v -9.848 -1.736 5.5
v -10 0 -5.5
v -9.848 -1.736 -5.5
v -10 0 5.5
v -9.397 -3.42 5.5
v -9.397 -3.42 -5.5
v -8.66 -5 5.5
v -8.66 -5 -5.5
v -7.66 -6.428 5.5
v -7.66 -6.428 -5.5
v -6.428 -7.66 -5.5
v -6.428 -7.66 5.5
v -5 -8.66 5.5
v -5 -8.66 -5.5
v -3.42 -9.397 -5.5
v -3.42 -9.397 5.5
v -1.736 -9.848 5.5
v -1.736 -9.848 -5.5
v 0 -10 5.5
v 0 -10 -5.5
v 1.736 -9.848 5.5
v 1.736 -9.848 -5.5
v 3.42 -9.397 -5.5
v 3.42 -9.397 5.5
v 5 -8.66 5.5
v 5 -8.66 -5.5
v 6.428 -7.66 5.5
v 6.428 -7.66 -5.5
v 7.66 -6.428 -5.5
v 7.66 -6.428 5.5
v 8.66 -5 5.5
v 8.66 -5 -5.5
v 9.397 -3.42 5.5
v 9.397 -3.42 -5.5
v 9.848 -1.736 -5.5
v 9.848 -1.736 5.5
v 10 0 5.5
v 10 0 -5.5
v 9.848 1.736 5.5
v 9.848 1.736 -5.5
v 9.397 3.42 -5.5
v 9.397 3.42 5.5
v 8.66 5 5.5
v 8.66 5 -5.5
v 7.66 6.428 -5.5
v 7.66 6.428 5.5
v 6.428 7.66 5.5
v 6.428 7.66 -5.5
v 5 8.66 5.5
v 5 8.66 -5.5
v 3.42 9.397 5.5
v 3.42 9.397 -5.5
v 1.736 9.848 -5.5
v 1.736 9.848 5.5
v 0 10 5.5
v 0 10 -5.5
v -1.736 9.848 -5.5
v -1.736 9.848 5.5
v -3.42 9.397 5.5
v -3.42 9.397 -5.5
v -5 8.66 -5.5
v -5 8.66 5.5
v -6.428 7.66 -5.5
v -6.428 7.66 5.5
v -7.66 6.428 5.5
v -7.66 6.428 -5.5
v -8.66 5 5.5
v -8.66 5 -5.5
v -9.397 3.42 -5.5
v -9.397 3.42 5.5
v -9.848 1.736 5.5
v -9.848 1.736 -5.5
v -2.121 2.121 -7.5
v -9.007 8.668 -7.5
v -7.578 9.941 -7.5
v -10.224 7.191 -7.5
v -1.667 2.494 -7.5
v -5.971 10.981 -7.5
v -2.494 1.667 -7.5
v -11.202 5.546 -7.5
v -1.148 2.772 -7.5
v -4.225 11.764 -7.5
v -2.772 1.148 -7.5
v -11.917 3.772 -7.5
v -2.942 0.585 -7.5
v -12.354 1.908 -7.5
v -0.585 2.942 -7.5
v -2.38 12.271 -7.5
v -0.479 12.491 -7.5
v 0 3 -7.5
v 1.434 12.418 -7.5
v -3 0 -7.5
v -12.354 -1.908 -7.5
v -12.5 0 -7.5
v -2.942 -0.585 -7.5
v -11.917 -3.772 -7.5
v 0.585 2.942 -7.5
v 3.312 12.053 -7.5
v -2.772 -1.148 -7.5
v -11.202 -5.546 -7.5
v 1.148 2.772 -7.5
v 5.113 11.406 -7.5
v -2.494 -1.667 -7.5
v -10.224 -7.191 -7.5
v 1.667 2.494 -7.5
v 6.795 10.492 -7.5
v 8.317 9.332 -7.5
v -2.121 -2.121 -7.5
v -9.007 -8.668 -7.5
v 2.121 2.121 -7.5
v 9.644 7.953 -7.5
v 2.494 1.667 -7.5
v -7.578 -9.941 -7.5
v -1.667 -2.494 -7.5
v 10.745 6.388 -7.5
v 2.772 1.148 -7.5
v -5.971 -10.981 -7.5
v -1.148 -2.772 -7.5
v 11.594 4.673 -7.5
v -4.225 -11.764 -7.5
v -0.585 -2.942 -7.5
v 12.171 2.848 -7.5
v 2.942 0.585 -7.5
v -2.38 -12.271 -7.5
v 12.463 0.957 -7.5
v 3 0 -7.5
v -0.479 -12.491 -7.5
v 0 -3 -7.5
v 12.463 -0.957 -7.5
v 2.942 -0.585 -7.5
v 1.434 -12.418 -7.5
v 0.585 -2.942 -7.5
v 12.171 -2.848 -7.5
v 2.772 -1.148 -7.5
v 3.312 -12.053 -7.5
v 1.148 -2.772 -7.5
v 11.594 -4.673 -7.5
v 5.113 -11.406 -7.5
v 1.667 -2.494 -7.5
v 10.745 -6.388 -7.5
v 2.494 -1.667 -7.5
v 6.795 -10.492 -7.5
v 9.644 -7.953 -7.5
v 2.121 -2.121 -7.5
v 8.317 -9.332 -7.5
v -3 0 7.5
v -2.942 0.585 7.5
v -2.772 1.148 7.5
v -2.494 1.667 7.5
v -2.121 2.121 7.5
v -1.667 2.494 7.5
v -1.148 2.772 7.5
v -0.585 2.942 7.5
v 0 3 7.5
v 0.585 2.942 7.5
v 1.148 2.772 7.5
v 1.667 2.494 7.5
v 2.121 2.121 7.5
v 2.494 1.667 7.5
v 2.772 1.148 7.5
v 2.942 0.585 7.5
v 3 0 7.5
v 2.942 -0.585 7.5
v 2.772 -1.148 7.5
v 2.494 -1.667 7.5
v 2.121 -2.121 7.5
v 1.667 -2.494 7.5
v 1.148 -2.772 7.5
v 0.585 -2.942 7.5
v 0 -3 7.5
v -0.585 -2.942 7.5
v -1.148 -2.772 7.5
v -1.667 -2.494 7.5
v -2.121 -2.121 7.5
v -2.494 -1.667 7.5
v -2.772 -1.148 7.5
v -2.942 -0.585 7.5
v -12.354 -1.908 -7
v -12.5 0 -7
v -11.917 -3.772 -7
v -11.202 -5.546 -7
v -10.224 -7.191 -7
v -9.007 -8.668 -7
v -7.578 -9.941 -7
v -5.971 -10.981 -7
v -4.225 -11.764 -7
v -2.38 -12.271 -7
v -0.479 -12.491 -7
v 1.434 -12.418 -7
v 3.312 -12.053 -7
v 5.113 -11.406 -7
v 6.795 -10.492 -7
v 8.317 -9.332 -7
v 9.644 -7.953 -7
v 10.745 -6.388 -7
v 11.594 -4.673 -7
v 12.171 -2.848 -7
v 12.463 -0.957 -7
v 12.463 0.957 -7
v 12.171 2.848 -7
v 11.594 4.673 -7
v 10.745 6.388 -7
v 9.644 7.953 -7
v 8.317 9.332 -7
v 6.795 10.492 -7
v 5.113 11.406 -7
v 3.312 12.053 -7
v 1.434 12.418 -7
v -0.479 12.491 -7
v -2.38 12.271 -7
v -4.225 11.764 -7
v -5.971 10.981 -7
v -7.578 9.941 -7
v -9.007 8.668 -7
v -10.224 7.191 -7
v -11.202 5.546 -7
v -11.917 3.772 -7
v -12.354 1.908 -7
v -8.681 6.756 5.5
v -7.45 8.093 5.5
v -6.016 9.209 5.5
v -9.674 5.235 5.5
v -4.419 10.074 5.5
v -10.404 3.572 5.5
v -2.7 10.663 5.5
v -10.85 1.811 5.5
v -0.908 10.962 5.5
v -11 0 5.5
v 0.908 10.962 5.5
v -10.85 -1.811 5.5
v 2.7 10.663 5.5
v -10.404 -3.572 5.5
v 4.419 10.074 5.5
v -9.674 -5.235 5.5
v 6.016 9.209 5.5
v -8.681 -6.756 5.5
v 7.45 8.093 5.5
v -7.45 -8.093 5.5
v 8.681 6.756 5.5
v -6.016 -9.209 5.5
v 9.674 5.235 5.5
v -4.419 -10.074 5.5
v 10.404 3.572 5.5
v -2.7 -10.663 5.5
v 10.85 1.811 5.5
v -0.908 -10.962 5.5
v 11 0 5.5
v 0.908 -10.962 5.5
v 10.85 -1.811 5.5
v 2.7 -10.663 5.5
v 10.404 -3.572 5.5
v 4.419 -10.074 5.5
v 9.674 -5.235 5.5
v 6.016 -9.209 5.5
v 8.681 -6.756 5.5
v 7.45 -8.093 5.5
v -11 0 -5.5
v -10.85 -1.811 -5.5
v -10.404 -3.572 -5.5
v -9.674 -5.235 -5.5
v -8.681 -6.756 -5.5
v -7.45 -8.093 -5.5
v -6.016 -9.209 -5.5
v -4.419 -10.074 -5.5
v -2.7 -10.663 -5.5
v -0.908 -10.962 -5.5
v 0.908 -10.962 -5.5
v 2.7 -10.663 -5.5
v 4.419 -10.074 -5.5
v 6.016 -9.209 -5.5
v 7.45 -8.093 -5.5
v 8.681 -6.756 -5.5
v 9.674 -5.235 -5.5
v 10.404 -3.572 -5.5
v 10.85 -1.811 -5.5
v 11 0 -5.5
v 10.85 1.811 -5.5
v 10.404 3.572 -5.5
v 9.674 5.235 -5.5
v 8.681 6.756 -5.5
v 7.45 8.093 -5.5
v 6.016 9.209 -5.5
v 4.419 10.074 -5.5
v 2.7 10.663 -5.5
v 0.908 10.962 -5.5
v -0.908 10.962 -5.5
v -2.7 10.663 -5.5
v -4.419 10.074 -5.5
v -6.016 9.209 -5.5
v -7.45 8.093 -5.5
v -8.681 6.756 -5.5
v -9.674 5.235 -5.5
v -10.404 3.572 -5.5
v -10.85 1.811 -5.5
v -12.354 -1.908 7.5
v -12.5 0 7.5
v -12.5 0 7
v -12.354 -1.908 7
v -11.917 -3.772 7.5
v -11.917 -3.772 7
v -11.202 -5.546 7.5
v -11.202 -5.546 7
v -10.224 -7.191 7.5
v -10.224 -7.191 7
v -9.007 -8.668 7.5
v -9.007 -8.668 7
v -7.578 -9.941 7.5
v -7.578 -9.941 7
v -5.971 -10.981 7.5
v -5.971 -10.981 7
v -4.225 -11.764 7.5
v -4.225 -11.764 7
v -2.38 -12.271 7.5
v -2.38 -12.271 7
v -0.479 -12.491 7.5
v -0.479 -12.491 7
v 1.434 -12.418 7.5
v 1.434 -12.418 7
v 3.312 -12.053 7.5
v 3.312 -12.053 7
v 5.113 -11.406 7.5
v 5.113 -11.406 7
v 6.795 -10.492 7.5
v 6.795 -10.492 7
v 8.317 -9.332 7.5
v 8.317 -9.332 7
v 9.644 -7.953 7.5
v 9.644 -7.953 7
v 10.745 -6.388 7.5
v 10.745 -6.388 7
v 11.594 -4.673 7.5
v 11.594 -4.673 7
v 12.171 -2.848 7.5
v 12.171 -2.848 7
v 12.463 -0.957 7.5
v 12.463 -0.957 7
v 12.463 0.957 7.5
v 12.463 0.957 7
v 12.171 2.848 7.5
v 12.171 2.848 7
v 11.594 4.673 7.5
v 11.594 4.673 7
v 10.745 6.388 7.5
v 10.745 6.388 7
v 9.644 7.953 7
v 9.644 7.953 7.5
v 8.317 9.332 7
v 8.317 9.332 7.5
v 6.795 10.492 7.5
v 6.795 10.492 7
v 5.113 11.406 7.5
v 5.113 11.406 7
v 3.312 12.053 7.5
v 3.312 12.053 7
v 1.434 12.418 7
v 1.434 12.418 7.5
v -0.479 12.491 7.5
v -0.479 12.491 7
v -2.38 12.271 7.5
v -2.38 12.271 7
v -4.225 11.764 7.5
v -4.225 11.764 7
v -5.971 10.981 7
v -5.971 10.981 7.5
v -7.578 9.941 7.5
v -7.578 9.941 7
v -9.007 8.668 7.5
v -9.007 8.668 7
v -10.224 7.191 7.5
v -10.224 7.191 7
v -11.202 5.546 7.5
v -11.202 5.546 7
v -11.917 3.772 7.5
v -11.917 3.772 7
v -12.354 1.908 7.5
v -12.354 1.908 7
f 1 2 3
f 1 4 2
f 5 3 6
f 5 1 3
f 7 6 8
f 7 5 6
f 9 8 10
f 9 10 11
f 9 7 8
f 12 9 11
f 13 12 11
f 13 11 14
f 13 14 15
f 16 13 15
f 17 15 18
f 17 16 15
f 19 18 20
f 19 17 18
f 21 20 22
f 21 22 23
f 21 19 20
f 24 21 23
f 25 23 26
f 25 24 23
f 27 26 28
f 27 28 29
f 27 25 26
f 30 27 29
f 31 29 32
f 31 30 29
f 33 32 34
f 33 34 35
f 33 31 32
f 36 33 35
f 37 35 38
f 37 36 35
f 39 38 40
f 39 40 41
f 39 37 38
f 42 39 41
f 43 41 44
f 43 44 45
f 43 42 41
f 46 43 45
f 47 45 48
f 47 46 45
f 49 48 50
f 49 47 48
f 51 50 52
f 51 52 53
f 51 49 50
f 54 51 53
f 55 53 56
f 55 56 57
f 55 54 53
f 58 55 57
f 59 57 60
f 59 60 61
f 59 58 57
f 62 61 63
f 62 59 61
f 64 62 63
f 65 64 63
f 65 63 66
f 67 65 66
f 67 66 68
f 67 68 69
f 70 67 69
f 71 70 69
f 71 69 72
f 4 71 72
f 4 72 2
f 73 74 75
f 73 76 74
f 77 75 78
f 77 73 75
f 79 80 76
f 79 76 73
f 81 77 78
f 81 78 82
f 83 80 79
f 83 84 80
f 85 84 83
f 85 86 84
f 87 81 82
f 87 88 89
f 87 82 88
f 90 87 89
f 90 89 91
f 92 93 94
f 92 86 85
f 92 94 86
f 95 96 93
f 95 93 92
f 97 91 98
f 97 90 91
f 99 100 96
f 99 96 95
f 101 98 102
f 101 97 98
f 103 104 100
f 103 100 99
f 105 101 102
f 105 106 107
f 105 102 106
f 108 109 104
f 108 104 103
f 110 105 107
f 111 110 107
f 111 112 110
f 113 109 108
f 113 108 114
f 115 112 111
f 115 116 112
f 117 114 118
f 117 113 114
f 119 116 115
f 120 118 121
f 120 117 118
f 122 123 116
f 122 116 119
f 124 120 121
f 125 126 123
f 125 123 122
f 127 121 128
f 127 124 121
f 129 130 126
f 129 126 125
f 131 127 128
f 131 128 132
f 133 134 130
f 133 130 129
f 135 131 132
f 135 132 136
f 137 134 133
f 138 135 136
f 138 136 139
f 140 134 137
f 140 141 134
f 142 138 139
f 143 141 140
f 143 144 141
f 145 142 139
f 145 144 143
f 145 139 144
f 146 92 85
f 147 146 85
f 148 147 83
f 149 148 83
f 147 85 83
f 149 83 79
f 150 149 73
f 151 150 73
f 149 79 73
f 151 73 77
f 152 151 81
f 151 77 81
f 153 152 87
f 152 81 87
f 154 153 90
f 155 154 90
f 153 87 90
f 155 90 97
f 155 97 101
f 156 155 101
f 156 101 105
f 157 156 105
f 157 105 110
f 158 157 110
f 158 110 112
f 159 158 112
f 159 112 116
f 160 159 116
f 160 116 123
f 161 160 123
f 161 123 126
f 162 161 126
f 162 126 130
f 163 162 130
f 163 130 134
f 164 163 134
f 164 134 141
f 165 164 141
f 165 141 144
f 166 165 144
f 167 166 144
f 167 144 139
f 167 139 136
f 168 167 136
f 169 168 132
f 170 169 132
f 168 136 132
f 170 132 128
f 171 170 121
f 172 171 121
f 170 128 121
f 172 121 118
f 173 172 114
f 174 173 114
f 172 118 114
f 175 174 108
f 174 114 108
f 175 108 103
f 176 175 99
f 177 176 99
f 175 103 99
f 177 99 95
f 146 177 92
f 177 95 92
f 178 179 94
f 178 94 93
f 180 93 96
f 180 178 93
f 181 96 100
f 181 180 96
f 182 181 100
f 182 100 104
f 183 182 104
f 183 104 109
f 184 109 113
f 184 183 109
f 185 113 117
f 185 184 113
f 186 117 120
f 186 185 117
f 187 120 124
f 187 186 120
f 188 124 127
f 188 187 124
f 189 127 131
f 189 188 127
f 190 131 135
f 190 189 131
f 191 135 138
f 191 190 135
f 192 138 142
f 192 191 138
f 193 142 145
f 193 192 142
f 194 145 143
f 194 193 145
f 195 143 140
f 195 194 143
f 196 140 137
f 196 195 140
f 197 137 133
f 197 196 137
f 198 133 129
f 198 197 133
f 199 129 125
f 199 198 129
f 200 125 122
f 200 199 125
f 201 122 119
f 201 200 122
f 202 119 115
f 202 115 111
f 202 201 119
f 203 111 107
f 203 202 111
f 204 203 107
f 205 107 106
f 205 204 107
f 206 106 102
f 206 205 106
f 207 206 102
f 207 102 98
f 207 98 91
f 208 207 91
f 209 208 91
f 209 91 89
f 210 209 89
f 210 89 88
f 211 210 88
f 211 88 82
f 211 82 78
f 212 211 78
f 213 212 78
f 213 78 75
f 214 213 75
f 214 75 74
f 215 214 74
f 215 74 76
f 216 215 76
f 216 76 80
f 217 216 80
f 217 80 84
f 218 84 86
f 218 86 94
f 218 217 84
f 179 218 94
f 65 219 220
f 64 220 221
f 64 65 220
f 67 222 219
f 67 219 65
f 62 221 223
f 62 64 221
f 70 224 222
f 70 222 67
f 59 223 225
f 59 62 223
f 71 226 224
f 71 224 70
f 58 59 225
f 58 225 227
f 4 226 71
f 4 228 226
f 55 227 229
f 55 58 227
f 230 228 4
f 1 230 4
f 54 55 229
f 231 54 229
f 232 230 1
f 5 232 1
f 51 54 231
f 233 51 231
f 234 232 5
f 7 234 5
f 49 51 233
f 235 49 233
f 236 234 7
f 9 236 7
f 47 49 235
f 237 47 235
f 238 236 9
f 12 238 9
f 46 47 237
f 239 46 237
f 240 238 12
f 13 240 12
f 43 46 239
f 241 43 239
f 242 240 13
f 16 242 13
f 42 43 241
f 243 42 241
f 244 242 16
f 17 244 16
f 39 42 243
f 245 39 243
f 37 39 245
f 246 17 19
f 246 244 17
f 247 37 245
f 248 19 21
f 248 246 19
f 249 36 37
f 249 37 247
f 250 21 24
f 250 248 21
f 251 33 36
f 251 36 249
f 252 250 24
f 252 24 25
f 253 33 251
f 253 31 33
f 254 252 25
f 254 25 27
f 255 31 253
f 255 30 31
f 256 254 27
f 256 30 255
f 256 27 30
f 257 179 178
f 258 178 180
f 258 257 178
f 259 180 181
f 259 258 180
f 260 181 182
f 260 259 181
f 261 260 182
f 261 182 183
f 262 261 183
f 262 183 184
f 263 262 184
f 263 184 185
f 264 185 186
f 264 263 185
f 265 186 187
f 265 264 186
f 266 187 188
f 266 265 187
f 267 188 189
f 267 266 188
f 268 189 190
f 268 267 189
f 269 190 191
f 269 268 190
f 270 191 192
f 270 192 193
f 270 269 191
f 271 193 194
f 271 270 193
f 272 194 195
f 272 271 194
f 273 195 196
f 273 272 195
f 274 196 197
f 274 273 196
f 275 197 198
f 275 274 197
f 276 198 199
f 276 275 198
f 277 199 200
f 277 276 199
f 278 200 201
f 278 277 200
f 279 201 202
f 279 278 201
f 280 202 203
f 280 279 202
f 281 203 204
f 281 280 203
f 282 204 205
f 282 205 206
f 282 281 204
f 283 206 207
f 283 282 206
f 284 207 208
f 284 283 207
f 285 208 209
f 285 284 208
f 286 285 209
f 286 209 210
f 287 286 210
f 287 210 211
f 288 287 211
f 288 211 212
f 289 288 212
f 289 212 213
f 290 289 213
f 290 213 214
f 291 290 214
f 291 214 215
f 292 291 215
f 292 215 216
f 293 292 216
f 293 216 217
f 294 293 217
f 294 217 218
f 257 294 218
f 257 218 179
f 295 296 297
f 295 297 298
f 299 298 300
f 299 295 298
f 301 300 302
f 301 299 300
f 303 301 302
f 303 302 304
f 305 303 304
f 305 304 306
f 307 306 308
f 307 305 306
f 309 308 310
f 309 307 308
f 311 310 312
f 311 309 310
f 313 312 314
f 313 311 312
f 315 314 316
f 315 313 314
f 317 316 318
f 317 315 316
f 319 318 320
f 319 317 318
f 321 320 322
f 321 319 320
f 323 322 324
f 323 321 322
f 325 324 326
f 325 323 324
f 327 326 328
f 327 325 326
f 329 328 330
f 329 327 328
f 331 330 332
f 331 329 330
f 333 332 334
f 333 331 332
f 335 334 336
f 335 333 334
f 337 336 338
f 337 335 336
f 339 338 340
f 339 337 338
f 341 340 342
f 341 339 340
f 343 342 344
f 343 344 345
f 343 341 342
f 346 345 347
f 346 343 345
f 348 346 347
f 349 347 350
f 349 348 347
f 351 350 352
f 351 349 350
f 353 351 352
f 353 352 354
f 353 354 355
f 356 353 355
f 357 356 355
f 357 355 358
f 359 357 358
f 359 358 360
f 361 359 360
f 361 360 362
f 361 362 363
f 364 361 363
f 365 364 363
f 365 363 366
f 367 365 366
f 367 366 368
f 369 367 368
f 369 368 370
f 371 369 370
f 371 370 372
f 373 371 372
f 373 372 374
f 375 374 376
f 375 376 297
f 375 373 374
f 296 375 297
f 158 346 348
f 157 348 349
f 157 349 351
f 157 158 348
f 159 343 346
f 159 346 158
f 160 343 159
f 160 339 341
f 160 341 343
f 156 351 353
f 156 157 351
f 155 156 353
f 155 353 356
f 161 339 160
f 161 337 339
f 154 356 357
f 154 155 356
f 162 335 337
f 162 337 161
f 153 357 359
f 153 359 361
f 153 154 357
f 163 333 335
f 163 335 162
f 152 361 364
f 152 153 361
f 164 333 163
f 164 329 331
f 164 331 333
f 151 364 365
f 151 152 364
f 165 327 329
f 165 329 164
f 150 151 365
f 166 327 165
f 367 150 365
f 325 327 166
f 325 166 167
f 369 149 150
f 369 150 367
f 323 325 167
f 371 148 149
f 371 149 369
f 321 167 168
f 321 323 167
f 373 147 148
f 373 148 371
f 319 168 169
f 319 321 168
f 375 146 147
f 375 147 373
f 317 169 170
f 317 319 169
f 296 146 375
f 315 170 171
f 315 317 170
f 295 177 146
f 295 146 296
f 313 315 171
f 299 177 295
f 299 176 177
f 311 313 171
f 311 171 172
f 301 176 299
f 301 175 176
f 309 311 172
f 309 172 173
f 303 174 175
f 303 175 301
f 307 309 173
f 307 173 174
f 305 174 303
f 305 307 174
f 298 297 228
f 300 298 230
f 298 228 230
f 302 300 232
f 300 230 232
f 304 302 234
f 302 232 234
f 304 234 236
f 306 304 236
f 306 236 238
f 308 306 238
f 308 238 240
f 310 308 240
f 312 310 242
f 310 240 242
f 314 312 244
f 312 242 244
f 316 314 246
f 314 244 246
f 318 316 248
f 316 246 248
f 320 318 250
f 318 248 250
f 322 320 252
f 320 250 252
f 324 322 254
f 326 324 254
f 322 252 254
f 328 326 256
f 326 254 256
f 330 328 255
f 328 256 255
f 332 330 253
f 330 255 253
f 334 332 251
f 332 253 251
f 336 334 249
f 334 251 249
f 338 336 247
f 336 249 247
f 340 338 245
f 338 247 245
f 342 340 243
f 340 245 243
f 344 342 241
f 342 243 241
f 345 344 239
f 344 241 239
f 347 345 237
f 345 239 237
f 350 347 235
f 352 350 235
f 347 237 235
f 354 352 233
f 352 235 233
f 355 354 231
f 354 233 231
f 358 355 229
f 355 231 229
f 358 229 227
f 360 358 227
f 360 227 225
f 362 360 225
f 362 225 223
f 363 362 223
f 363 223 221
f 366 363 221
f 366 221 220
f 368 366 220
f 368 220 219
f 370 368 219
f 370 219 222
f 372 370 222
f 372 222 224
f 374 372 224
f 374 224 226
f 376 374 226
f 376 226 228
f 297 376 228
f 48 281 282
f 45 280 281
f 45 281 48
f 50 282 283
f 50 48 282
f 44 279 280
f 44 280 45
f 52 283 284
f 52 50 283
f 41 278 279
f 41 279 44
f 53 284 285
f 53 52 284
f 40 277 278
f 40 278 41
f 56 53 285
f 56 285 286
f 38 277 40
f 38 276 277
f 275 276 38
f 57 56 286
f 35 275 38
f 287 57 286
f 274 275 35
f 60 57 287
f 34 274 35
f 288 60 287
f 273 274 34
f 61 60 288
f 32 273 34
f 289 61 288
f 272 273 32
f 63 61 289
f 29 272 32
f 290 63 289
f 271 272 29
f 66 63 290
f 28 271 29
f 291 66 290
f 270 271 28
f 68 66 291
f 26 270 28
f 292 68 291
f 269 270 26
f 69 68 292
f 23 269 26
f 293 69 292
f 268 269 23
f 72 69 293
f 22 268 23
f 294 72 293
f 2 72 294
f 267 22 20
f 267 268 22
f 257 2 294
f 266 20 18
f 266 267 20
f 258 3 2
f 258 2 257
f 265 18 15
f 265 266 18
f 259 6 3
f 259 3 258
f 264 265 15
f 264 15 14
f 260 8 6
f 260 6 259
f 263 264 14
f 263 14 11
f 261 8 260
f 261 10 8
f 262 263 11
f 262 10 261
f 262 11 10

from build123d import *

# Parameters (mm, degrees)
SKETCH2_R          = 3
CUT_EXTRUDE1_DEPTH = 24.184046239
CHAMFER1_SIZE      = 1.5


with BuildPart() as part:
    # Sketch1 → Revolve1 (revolve)
    with BuildSketch(Plane(origin=(0, 0, 0), x_dir=(1, 0, 0), z_dir=(0, 1, 0)), mode=Mode.PRIVATE) as revolve1_sk:
        Polygon((0, 7.5), (12.5, 7.5), (12.5, 5.5), (10, 5.5), (10, -5.5), (12.5, -5.5), (12.5, -7.5), (0, -7.5), align=None)
    revolve(revolve1_sk.sketch.rotate(Axis((0, 0, -16.700819672), (0, 0, 1)), 180), axis=Axis((0, 0, -16.700819672), (0, 0, 1)))

    # Sketch2 → Cut-Extrude1 (cut, through all)
    with BuildSketch(Plane(origin=(0, 0, -7.5), x_dir=(-1, 0, 0), z_dir=(0, 0, -1))):
        Circle(SKETCH2_R)
    extrude(amount=-CUT_EXTRUDE1_DEPTH, mode=Mode.SUBTRACT)

    # Chamfer1
    chamfer1_edges = [part.edges().sort_by_distance(p)[0] for p in [
        (12.5, 0, -5.5),
        (12.5, 0, 5.5),
    ]]
    chamfer(chamfer1_edges, length=CHAMFER1_SIZE)


solid = part.part
